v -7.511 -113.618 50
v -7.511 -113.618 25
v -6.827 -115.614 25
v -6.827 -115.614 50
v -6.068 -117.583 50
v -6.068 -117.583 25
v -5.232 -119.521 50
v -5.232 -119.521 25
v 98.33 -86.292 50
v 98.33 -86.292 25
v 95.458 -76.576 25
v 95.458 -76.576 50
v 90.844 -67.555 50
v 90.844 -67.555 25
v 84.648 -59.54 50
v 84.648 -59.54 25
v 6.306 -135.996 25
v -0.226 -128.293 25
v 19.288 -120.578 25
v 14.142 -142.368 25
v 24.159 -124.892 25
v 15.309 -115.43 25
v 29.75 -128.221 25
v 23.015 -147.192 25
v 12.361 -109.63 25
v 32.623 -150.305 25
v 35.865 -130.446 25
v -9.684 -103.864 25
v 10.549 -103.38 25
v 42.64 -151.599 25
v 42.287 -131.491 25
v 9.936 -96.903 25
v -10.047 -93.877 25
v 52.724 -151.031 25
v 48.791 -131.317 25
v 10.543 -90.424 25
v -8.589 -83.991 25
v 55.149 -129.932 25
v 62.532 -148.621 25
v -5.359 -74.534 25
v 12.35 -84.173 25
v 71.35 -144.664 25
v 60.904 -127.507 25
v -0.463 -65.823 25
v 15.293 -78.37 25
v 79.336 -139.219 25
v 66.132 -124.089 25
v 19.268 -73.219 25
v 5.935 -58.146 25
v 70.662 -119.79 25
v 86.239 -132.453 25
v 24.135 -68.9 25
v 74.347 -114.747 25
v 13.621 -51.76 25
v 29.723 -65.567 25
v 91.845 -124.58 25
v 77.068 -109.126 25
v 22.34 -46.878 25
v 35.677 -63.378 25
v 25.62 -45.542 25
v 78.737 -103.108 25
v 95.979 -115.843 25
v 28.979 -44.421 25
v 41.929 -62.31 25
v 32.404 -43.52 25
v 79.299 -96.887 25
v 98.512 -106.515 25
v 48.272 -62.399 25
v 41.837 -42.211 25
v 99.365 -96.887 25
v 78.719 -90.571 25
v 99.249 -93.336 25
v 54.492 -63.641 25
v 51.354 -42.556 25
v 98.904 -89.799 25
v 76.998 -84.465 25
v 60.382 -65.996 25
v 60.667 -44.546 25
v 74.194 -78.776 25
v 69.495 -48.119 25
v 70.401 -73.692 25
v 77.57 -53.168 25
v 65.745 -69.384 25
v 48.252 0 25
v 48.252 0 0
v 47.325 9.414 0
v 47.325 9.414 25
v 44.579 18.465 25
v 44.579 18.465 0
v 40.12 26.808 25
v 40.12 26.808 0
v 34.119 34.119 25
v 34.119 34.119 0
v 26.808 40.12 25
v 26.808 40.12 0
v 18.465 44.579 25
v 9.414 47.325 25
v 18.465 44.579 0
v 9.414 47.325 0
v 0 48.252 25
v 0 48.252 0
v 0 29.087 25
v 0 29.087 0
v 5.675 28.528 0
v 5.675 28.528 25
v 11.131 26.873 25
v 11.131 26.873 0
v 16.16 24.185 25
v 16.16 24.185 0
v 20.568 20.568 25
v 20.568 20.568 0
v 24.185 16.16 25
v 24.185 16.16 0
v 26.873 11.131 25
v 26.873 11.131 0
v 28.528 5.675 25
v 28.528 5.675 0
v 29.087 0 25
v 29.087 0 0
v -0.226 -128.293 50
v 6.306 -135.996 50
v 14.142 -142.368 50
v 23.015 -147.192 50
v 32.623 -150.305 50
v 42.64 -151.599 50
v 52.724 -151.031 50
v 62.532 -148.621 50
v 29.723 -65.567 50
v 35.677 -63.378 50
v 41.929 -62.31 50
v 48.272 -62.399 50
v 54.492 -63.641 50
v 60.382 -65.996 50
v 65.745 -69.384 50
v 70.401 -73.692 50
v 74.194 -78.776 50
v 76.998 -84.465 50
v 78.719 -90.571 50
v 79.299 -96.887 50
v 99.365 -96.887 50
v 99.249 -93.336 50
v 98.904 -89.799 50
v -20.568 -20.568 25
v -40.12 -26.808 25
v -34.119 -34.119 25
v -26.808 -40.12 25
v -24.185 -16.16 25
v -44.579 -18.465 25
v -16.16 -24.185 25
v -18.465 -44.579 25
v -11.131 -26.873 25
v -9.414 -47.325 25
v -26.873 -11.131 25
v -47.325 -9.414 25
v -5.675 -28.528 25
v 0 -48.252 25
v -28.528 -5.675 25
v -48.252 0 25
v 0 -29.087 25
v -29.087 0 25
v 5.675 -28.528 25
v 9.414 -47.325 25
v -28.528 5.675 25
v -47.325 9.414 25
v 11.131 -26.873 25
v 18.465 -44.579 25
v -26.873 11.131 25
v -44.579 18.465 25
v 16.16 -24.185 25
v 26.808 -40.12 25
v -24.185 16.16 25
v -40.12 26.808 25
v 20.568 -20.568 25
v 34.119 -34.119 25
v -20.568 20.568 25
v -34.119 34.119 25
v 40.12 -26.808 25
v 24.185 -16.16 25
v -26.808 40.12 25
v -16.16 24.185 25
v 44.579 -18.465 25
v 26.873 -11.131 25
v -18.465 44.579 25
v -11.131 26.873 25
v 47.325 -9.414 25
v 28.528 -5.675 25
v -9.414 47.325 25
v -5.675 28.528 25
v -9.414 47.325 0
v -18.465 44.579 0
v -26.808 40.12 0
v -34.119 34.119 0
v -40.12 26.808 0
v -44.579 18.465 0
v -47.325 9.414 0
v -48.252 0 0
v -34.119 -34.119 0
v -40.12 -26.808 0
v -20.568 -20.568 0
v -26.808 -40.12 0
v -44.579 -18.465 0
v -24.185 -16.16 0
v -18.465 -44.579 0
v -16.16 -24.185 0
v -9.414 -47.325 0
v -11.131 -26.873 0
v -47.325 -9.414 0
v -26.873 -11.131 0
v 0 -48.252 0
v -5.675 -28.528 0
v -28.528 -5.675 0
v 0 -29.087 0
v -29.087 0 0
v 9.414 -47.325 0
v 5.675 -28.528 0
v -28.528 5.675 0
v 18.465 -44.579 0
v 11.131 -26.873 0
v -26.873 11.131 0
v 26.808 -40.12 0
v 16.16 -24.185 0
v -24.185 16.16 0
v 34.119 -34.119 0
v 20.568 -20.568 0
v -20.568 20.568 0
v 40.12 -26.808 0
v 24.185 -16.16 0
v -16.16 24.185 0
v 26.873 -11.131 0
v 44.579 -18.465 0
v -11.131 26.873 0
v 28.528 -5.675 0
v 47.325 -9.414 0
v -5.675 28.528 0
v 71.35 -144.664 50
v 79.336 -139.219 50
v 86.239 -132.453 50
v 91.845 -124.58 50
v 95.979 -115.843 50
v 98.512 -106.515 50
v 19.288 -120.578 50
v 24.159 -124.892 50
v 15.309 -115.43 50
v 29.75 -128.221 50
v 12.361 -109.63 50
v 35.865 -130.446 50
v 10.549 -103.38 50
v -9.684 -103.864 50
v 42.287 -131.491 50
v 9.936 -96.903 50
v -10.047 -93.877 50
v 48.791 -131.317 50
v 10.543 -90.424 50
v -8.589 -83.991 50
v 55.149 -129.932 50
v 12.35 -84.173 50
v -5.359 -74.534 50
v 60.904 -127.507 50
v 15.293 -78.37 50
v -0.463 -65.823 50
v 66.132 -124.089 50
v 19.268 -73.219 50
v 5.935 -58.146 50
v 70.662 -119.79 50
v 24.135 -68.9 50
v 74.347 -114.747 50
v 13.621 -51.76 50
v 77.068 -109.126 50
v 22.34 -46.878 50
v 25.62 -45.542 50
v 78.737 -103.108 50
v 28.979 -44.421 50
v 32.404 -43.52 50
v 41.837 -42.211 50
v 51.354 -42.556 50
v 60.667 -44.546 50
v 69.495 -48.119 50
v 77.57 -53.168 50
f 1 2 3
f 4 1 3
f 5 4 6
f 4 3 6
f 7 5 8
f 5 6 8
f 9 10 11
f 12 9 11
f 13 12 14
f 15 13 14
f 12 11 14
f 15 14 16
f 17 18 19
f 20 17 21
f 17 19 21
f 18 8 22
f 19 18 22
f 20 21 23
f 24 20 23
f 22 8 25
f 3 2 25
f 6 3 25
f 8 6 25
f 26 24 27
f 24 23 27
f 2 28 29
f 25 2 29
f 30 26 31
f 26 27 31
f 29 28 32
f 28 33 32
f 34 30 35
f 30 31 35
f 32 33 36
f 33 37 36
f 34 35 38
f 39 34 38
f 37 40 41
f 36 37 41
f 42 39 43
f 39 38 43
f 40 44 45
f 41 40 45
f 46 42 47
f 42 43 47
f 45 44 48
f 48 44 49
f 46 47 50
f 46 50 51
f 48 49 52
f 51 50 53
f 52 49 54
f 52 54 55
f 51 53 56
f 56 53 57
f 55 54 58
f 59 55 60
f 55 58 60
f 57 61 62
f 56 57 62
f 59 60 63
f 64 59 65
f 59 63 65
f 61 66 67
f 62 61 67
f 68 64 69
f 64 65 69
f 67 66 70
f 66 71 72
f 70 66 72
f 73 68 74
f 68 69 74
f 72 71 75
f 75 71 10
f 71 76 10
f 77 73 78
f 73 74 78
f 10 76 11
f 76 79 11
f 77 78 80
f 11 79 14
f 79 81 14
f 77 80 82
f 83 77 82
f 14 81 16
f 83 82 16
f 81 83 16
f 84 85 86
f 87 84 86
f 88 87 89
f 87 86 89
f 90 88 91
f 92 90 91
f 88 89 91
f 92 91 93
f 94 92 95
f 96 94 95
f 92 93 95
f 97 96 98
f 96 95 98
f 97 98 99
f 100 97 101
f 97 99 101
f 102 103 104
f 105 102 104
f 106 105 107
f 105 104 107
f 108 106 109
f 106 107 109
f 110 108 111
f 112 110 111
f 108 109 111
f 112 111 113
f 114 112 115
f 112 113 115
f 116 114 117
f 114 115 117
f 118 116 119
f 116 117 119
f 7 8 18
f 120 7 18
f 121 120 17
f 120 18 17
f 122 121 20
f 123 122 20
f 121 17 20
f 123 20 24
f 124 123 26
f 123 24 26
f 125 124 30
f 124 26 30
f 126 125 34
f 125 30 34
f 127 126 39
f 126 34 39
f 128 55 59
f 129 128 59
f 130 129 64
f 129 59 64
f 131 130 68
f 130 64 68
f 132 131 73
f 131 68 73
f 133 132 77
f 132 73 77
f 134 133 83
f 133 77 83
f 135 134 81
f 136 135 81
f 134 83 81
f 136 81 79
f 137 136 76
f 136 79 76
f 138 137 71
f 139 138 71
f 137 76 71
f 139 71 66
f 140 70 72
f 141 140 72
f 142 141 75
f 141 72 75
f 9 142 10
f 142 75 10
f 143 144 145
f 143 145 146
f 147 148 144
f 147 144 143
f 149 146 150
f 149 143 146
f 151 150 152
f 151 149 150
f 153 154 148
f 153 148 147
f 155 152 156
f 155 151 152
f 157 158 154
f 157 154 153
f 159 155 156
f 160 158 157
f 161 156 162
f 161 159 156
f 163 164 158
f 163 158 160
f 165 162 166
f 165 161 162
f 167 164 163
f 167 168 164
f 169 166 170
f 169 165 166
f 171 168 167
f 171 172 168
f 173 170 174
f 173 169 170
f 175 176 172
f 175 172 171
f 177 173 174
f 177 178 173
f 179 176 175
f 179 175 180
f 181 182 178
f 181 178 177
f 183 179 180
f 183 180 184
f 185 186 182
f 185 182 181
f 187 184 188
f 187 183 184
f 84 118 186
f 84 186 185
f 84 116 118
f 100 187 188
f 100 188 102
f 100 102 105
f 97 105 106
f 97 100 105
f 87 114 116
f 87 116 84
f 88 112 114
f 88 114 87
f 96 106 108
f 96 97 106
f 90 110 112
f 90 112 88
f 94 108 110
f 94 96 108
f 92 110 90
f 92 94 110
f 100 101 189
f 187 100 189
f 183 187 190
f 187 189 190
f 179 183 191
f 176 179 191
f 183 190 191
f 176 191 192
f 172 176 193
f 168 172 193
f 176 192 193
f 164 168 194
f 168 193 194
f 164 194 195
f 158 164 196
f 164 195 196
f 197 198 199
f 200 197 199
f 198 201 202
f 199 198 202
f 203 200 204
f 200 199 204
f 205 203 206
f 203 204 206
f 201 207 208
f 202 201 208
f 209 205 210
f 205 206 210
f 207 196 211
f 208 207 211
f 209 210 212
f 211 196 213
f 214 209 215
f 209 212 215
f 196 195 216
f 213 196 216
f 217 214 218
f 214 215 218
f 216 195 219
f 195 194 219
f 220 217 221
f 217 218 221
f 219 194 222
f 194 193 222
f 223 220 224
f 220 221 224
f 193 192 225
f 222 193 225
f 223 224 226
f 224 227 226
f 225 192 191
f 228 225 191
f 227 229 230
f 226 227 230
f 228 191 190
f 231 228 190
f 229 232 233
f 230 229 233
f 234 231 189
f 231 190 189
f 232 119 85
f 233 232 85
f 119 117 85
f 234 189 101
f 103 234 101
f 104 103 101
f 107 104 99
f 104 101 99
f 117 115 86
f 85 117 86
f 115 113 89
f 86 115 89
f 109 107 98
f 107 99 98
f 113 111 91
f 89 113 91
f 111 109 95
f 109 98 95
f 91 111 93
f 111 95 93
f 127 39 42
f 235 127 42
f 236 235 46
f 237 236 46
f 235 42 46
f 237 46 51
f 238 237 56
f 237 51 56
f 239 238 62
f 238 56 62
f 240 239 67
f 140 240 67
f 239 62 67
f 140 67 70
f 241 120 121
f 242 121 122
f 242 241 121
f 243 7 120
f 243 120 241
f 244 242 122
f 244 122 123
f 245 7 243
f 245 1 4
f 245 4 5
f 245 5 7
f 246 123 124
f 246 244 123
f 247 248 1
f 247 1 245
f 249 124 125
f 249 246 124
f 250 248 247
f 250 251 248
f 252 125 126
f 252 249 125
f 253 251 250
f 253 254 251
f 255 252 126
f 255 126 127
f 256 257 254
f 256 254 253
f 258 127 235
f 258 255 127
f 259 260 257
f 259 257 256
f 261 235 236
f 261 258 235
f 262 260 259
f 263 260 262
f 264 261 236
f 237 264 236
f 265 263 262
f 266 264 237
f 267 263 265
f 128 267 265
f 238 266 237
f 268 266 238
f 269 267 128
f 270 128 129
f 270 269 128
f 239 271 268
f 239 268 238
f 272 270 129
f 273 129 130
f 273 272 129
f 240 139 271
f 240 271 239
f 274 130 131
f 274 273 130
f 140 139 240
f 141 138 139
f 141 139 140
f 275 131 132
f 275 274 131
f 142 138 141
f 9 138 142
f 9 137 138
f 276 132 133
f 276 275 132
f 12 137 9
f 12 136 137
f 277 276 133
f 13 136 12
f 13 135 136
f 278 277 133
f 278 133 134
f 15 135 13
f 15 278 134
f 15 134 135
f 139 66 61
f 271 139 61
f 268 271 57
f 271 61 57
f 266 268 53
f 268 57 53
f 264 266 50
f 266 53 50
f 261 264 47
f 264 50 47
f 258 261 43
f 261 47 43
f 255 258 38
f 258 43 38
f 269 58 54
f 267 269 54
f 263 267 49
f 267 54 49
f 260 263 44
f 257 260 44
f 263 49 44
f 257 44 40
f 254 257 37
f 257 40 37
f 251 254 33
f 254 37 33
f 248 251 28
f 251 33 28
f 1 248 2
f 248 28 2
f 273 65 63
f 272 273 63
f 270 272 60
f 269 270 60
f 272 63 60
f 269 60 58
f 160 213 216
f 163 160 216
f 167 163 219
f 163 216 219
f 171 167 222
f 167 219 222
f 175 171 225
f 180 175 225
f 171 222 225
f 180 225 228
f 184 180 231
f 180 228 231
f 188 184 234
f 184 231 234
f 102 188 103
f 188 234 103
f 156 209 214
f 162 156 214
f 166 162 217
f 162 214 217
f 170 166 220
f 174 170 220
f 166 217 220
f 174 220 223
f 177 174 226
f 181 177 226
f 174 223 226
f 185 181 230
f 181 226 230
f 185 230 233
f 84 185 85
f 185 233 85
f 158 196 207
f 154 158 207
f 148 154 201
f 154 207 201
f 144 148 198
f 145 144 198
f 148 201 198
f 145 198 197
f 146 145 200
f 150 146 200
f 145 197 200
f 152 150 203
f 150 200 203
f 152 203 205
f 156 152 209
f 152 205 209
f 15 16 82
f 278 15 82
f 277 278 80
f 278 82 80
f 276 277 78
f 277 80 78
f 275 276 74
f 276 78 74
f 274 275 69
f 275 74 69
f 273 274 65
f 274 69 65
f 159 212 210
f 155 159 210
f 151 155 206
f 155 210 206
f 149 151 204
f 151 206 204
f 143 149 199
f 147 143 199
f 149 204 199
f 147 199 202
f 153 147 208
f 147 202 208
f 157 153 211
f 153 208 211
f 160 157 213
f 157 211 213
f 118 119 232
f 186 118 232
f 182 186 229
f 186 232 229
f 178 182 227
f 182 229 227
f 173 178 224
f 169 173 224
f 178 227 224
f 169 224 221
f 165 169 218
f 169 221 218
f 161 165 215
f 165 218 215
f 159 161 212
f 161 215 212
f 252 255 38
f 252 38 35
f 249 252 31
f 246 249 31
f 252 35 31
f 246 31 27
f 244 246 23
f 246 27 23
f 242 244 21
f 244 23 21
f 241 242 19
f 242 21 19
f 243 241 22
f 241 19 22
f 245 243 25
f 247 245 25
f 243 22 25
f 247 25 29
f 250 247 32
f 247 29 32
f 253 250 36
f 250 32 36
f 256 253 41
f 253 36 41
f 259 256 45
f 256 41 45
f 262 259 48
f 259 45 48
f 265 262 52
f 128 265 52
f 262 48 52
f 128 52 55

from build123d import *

# Parameters (mm, degrees)
F1_DEPTH = 25
F3_DEPTH = 25


with BuildPart() as f1:
    # F0 (on Top) → F1 (new body)
    with BuildSketch(Plane.XY):
        with BuildLine():
            Line((48.252245, 0), (29.087361, 0))
            ThreePointArc((29.087361, 0), (20.56787, -20.56787), (0, -29.087361))
            Line((0, -29.087361), (0, -48.252245))
            ThreePointArc((0, -48.252245), (34.11949, -34.11949), (48.252245, 0))
        make_face()
        with BuildLine():
            ThreePointArc((0, 29.087361), (20.56787, 20.56787), (29.087361, 0))
            Line((29.087361, 0), (48.252245, 0))
            ThreePointArc((48.252245, 0), (34.11949, 34.11949), (0, 48.252245))
            Line((0, 48.252245), (0, 29.087361))
        make_face()
        with BuildLine():
            ThreePointArc((-29.087361, 0), (-20.56787, 20.56787), (0, 29.087361))
            Line((0, 29.087361), (0, 48.252245))
            ThreePointArc((0, 48.252245), (-34.11949, 34.11949), (-48.252245, 0))
            Line((-48.252245, 0), (-29.087361, 0))
        make_face()
        with BuildLine():
            Line((0, -48.252245), (0, -29.087361))
            ThreePointArc((0, -29.087361), (-20.56787, -20.56787), (-29.087361, 0))
            Line((-29.087361, 0), (-48.252245, 0))
            ThreePointArc((-48.252245, 0), (-34.11949, -34.11949), (0, -48.252245))
        make_face()
    extrude(amount=F1_DEPTH)


with BuildPart() as f3:
    # F2 (on face) → F3 (new body)
    with BuildSketch(Plane.XY.offset(25)):
        with BuildLine():
            ThreePointArc((29.722963, -65.566895), (63.141172, -67.566874), (79.299199, -96.887425))
            ThreePointArc((79.299199, -96.887425), (72.618081, -117.351738), (55.148838, -129.931524))
            Line((55.148838, -129.931524), (62.531681, -148.620908))
            ThreePointArc((62.531681, -148.620908), (89.215834, -128.64051), (99.364822, -96.887425))
            ThreePointArc((99.364822, -96.887425), (99.105429, -91.564377), (98.329709, -86.29177))
            Line((98.329709, -86.29177), (84.647602, -59.539588))
            ThreePointArc((84.647602, -59.539588), (60.667352, -44.545535), (32.403914, -43.519822))
            ThreePointArc((32.403914, -43.519822), (27.290492, -44.954316), (22.34012, -46.87751))
            Line((22.34012, -46.87751), (29.722963, -65.566895))
        make_face()
        with BuildLine():
            ThreePointArc((55.148838, -129.931524), (12.361302, -109.629538), (29.722963, -65.566895))
            Line((29.722963, -65.566895), (22.34012, -46.87751))
            ThreePointArc((22.34012, -46.87751), (-5.358679, -74.534434), (-7.510946, -113.617636))
            Line((-7.510946, -113.617636), (-5.232335, -119.520778))
            ThreePointArc((-5.232335, -119.520778), (23.014811, -147.192465), (62.531681, -148.620908))
            Line((62.531681, -148.620908), (55.148838, -129.931524))
        make_face()
        with BuildLine():
            Line((-5.232335, -119.520778), (-7.510946, -113.617636))
            ThreePointArc((-7.510946, -113.617636), (-6.456997, -116.602154), (-5.232335, -119.520778))
        make_face()
        with BuildLine():
            ThreePointArc((98.329709, -86.29177), (93.359934, -71.958634), (84.647602, -59.539588))
            Line((84.647602, -59.539588), (98.329709, -86.29177))
        make_face()
    extrude(amount=F3_DEPTH)


solid = Compound([f1.part, f3.part])
